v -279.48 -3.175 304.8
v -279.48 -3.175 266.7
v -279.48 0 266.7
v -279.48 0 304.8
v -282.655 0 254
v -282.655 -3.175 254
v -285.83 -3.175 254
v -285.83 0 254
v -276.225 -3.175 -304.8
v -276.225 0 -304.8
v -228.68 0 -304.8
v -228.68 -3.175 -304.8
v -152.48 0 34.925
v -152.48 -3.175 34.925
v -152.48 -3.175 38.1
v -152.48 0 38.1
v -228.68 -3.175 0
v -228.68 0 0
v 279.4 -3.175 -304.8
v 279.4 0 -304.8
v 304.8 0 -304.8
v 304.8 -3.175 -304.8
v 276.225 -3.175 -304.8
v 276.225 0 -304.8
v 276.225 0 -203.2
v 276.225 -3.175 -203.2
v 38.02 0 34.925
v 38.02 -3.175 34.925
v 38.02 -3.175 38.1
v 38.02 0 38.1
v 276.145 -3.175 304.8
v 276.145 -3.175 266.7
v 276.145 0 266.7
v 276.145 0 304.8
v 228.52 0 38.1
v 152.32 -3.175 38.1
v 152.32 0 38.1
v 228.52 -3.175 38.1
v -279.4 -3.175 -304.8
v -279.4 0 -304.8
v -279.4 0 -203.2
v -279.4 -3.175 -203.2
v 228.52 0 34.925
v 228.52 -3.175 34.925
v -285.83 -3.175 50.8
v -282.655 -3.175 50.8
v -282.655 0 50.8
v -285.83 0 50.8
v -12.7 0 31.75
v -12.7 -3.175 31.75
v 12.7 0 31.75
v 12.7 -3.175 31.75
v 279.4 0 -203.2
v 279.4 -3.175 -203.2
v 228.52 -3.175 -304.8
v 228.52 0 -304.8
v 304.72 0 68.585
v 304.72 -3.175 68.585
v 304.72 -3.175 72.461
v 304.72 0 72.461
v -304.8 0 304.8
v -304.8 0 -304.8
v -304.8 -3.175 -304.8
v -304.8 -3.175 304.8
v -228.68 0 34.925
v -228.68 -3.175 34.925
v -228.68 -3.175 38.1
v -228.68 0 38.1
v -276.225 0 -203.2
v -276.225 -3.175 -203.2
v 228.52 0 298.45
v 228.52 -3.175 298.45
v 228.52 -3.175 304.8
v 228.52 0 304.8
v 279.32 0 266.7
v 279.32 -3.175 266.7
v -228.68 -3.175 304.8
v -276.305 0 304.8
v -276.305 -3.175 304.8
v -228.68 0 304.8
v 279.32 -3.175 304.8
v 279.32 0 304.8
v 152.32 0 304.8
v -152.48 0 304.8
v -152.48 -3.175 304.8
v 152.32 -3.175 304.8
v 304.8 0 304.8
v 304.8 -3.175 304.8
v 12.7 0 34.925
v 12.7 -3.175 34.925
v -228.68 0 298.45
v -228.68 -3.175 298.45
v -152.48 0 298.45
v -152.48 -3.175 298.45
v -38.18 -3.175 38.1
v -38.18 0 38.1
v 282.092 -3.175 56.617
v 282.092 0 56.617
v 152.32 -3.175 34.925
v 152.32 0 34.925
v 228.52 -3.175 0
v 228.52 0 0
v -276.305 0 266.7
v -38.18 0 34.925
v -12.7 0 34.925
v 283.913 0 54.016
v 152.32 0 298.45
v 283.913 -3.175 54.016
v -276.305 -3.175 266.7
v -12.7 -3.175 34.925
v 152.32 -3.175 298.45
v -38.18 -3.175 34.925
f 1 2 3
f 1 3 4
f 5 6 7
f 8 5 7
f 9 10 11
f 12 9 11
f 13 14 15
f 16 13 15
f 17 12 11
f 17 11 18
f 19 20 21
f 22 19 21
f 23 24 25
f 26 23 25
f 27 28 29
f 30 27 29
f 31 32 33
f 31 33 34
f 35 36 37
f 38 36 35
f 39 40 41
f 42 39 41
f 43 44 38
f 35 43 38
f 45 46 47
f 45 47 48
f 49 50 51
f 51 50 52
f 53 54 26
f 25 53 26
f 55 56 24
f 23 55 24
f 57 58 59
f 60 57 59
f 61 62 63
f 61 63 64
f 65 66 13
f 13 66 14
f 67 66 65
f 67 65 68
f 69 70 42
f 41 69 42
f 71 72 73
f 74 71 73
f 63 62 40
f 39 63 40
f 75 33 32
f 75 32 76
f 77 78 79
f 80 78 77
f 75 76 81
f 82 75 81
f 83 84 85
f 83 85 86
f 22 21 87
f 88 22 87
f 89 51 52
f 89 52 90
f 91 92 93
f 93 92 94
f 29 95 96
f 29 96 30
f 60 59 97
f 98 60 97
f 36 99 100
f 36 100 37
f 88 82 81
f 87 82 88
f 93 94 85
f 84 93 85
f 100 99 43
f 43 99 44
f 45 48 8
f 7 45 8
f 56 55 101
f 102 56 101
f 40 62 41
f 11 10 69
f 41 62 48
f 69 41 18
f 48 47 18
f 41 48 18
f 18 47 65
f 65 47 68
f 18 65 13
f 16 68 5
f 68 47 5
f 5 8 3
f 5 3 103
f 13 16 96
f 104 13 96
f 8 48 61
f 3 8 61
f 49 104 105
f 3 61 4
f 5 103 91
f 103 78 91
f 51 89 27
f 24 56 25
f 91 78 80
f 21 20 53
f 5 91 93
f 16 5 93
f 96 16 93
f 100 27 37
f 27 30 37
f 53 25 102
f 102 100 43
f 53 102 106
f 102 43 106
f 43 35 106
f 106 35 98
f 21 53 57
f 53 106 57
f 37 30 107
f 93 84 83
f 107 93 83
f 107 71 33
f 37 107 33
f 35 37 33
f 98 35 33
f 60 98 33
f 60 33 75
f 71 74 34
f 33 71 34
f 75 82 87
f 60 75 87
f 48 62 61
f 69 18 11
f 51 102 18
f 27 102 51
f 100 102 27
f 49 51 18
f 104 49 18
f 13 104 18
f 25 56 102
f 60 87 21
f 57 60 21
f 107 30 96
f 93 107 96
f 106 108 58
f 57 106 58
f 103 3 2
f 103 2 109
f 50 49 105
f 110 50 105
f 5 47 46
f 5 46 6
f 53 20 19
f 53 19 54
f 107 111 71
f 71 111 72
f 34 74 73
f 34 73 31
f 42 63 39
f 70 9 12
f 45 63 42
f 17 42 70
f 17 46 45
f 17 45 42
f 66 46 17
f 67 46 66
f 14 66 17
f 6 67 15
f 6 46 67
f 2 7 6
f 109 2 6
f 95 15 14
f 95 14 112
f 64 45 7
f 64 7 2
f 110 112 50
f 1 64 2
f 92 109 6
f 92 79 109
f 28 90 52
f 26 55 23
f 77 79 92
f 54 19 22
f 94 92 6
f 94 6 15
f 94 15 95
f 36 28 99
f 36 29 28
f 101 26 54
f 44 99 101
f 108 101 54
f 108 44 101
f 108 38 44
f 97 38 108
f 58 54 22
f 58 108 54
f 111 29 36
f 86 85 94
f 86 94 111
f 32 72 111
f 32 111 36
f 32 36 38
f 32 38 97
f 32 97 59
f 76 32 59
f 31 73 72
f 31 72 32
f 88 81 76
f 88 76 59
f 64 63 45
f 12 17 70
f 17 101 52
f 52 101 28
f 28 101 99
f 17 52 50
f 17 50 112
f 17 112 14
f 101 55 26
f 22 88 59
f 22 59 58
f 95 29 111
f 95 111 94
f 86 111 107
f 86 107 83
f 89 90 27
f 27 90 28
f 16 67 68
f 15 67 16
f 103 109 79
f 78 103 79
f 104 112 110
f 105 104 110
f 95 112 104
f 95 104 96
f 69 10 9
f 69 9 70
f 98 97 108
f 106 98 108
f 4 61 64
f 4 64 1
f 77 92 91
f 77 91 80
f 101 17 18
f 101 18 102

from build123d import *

# Parameters (mm, degrees)
F0_W      = 609.6
F0_H      = 609.6
F1_DEPTH  = 3.175
F2_W      = 457.2
F2_H      = 304.8
F2_W_2    = 3.175
F2_H_2    = 152.4
F2_W_3    = 76.2
F2_H_3    = 3.175
F2_H_4    = 6.35
F3_DEPTH  = 3.176
F4_W      = 3.175
F4_H      = 101.6
F5_DEPTH  = 3.176
F6_W      = 3.175
F6_H      = 203.2
F7_DEPTH  = 3.176
F8_W      = 25.4
F8_H      = 3.175
F9_DEPTH  = 25.4
F10_W     = 3.175
F10_H     = 114.3
F11_DEPTH = 3.175


with BuildPart() as f1:
    # F0 (on Front) → F1 (new body)
    with BuildSketch(Plane.XZ):
        Rectangle(F0_W, F0_H)
    extrude(amount=F1_DEPTH)

    # F2 (on face) → F3 (cut, through all)
    with BuildSketch(Plane.XZ.offset(3.175)):
        with Locations((-0.080462, -152.4)):
            Rectangle(F2_W, F2_H)
        with Locations((-277.892962, 228.6)):
            Rectangle(F2_W_2, F2_H_2)
        with Locations((277.732038, 228.6)):
            Rectangle(F2_W_2, F2_H_2)
        Polygon((283.913076, 54.01643), (304.719538, 68.585271), (304.719538, 72.461231), (282.091971, 56.617238), align=None)
        with Locations((-190.580462, 36.5125)):
            Rectangle(F2_W_3, F2_H_3)
        with Locations((-0.080462, 36.5125)):
            Rectangle(F2_W_3, F2_H_3)
        with Locations((190.419538, 36.5125)):
            Rectangle(F2_W_3, F2_H_3)
        with Locations((-190.580462, 301.625)):
            Rectangle(F2_W_3, F2_H_4)
        with Locations((190.419538, 301.625)):
            Rectangle(F2_W_3, F2_H_4)
    extrude(amount=-F3_DEPTH, mode=Mode.SUBTRACT)

    # F4 (on face) → F5 (cut, through all)
    with BuildSketch(Plane(origin=(0, 0, 0), x_dir=(-1, 0, 0), z_dir=(0, 1, 0))):
        with Locations((-277.8125, -254)):
            Rectangle(F4_W, F4_H)
        with Locations((277.8125, -254)):
            Rectangle(F4_W, F4_H)
    extrude(amount=-F5_DEPTH, mode=Mode.SUBTRACT)

    # F6 (on face) → F7 (cut, through all)
    with BuildSketch(Plane(origin=(0, 0, 0), x_dir=(-1, 0, 0), z_dir=(0, 1, 0))):
        with Locations((284.242962, 152.4)):
            Rectangle(F6_W, F6_H)
    extrude(amount=-F7_DEPTH, mode=Mode.SUBTRACT)

    # F8 (on face) → F9 (cut)
    with BuildSketch(Plane.XZ.offset(3.175)):
        with Locations((0, 33.3375)):
            Rectangle(F8_W, F8_H)
    extrude(amount=-F9_DEPTH, mode=Mode.SUBTRACT)

    # F10 (on face) → F11 (join)
    with BuildSketch(Plane.XZ.offset(3.175)):
        with Locations((-277.892962, 209.55)):
            Rectangle(F10_W, F10_H)
        with Locations((277.732038, 209.55)):
            Rectangle(F10_W, F10_H)
    extrude(amount=-F11_DEPTH)


solid = f1.part
